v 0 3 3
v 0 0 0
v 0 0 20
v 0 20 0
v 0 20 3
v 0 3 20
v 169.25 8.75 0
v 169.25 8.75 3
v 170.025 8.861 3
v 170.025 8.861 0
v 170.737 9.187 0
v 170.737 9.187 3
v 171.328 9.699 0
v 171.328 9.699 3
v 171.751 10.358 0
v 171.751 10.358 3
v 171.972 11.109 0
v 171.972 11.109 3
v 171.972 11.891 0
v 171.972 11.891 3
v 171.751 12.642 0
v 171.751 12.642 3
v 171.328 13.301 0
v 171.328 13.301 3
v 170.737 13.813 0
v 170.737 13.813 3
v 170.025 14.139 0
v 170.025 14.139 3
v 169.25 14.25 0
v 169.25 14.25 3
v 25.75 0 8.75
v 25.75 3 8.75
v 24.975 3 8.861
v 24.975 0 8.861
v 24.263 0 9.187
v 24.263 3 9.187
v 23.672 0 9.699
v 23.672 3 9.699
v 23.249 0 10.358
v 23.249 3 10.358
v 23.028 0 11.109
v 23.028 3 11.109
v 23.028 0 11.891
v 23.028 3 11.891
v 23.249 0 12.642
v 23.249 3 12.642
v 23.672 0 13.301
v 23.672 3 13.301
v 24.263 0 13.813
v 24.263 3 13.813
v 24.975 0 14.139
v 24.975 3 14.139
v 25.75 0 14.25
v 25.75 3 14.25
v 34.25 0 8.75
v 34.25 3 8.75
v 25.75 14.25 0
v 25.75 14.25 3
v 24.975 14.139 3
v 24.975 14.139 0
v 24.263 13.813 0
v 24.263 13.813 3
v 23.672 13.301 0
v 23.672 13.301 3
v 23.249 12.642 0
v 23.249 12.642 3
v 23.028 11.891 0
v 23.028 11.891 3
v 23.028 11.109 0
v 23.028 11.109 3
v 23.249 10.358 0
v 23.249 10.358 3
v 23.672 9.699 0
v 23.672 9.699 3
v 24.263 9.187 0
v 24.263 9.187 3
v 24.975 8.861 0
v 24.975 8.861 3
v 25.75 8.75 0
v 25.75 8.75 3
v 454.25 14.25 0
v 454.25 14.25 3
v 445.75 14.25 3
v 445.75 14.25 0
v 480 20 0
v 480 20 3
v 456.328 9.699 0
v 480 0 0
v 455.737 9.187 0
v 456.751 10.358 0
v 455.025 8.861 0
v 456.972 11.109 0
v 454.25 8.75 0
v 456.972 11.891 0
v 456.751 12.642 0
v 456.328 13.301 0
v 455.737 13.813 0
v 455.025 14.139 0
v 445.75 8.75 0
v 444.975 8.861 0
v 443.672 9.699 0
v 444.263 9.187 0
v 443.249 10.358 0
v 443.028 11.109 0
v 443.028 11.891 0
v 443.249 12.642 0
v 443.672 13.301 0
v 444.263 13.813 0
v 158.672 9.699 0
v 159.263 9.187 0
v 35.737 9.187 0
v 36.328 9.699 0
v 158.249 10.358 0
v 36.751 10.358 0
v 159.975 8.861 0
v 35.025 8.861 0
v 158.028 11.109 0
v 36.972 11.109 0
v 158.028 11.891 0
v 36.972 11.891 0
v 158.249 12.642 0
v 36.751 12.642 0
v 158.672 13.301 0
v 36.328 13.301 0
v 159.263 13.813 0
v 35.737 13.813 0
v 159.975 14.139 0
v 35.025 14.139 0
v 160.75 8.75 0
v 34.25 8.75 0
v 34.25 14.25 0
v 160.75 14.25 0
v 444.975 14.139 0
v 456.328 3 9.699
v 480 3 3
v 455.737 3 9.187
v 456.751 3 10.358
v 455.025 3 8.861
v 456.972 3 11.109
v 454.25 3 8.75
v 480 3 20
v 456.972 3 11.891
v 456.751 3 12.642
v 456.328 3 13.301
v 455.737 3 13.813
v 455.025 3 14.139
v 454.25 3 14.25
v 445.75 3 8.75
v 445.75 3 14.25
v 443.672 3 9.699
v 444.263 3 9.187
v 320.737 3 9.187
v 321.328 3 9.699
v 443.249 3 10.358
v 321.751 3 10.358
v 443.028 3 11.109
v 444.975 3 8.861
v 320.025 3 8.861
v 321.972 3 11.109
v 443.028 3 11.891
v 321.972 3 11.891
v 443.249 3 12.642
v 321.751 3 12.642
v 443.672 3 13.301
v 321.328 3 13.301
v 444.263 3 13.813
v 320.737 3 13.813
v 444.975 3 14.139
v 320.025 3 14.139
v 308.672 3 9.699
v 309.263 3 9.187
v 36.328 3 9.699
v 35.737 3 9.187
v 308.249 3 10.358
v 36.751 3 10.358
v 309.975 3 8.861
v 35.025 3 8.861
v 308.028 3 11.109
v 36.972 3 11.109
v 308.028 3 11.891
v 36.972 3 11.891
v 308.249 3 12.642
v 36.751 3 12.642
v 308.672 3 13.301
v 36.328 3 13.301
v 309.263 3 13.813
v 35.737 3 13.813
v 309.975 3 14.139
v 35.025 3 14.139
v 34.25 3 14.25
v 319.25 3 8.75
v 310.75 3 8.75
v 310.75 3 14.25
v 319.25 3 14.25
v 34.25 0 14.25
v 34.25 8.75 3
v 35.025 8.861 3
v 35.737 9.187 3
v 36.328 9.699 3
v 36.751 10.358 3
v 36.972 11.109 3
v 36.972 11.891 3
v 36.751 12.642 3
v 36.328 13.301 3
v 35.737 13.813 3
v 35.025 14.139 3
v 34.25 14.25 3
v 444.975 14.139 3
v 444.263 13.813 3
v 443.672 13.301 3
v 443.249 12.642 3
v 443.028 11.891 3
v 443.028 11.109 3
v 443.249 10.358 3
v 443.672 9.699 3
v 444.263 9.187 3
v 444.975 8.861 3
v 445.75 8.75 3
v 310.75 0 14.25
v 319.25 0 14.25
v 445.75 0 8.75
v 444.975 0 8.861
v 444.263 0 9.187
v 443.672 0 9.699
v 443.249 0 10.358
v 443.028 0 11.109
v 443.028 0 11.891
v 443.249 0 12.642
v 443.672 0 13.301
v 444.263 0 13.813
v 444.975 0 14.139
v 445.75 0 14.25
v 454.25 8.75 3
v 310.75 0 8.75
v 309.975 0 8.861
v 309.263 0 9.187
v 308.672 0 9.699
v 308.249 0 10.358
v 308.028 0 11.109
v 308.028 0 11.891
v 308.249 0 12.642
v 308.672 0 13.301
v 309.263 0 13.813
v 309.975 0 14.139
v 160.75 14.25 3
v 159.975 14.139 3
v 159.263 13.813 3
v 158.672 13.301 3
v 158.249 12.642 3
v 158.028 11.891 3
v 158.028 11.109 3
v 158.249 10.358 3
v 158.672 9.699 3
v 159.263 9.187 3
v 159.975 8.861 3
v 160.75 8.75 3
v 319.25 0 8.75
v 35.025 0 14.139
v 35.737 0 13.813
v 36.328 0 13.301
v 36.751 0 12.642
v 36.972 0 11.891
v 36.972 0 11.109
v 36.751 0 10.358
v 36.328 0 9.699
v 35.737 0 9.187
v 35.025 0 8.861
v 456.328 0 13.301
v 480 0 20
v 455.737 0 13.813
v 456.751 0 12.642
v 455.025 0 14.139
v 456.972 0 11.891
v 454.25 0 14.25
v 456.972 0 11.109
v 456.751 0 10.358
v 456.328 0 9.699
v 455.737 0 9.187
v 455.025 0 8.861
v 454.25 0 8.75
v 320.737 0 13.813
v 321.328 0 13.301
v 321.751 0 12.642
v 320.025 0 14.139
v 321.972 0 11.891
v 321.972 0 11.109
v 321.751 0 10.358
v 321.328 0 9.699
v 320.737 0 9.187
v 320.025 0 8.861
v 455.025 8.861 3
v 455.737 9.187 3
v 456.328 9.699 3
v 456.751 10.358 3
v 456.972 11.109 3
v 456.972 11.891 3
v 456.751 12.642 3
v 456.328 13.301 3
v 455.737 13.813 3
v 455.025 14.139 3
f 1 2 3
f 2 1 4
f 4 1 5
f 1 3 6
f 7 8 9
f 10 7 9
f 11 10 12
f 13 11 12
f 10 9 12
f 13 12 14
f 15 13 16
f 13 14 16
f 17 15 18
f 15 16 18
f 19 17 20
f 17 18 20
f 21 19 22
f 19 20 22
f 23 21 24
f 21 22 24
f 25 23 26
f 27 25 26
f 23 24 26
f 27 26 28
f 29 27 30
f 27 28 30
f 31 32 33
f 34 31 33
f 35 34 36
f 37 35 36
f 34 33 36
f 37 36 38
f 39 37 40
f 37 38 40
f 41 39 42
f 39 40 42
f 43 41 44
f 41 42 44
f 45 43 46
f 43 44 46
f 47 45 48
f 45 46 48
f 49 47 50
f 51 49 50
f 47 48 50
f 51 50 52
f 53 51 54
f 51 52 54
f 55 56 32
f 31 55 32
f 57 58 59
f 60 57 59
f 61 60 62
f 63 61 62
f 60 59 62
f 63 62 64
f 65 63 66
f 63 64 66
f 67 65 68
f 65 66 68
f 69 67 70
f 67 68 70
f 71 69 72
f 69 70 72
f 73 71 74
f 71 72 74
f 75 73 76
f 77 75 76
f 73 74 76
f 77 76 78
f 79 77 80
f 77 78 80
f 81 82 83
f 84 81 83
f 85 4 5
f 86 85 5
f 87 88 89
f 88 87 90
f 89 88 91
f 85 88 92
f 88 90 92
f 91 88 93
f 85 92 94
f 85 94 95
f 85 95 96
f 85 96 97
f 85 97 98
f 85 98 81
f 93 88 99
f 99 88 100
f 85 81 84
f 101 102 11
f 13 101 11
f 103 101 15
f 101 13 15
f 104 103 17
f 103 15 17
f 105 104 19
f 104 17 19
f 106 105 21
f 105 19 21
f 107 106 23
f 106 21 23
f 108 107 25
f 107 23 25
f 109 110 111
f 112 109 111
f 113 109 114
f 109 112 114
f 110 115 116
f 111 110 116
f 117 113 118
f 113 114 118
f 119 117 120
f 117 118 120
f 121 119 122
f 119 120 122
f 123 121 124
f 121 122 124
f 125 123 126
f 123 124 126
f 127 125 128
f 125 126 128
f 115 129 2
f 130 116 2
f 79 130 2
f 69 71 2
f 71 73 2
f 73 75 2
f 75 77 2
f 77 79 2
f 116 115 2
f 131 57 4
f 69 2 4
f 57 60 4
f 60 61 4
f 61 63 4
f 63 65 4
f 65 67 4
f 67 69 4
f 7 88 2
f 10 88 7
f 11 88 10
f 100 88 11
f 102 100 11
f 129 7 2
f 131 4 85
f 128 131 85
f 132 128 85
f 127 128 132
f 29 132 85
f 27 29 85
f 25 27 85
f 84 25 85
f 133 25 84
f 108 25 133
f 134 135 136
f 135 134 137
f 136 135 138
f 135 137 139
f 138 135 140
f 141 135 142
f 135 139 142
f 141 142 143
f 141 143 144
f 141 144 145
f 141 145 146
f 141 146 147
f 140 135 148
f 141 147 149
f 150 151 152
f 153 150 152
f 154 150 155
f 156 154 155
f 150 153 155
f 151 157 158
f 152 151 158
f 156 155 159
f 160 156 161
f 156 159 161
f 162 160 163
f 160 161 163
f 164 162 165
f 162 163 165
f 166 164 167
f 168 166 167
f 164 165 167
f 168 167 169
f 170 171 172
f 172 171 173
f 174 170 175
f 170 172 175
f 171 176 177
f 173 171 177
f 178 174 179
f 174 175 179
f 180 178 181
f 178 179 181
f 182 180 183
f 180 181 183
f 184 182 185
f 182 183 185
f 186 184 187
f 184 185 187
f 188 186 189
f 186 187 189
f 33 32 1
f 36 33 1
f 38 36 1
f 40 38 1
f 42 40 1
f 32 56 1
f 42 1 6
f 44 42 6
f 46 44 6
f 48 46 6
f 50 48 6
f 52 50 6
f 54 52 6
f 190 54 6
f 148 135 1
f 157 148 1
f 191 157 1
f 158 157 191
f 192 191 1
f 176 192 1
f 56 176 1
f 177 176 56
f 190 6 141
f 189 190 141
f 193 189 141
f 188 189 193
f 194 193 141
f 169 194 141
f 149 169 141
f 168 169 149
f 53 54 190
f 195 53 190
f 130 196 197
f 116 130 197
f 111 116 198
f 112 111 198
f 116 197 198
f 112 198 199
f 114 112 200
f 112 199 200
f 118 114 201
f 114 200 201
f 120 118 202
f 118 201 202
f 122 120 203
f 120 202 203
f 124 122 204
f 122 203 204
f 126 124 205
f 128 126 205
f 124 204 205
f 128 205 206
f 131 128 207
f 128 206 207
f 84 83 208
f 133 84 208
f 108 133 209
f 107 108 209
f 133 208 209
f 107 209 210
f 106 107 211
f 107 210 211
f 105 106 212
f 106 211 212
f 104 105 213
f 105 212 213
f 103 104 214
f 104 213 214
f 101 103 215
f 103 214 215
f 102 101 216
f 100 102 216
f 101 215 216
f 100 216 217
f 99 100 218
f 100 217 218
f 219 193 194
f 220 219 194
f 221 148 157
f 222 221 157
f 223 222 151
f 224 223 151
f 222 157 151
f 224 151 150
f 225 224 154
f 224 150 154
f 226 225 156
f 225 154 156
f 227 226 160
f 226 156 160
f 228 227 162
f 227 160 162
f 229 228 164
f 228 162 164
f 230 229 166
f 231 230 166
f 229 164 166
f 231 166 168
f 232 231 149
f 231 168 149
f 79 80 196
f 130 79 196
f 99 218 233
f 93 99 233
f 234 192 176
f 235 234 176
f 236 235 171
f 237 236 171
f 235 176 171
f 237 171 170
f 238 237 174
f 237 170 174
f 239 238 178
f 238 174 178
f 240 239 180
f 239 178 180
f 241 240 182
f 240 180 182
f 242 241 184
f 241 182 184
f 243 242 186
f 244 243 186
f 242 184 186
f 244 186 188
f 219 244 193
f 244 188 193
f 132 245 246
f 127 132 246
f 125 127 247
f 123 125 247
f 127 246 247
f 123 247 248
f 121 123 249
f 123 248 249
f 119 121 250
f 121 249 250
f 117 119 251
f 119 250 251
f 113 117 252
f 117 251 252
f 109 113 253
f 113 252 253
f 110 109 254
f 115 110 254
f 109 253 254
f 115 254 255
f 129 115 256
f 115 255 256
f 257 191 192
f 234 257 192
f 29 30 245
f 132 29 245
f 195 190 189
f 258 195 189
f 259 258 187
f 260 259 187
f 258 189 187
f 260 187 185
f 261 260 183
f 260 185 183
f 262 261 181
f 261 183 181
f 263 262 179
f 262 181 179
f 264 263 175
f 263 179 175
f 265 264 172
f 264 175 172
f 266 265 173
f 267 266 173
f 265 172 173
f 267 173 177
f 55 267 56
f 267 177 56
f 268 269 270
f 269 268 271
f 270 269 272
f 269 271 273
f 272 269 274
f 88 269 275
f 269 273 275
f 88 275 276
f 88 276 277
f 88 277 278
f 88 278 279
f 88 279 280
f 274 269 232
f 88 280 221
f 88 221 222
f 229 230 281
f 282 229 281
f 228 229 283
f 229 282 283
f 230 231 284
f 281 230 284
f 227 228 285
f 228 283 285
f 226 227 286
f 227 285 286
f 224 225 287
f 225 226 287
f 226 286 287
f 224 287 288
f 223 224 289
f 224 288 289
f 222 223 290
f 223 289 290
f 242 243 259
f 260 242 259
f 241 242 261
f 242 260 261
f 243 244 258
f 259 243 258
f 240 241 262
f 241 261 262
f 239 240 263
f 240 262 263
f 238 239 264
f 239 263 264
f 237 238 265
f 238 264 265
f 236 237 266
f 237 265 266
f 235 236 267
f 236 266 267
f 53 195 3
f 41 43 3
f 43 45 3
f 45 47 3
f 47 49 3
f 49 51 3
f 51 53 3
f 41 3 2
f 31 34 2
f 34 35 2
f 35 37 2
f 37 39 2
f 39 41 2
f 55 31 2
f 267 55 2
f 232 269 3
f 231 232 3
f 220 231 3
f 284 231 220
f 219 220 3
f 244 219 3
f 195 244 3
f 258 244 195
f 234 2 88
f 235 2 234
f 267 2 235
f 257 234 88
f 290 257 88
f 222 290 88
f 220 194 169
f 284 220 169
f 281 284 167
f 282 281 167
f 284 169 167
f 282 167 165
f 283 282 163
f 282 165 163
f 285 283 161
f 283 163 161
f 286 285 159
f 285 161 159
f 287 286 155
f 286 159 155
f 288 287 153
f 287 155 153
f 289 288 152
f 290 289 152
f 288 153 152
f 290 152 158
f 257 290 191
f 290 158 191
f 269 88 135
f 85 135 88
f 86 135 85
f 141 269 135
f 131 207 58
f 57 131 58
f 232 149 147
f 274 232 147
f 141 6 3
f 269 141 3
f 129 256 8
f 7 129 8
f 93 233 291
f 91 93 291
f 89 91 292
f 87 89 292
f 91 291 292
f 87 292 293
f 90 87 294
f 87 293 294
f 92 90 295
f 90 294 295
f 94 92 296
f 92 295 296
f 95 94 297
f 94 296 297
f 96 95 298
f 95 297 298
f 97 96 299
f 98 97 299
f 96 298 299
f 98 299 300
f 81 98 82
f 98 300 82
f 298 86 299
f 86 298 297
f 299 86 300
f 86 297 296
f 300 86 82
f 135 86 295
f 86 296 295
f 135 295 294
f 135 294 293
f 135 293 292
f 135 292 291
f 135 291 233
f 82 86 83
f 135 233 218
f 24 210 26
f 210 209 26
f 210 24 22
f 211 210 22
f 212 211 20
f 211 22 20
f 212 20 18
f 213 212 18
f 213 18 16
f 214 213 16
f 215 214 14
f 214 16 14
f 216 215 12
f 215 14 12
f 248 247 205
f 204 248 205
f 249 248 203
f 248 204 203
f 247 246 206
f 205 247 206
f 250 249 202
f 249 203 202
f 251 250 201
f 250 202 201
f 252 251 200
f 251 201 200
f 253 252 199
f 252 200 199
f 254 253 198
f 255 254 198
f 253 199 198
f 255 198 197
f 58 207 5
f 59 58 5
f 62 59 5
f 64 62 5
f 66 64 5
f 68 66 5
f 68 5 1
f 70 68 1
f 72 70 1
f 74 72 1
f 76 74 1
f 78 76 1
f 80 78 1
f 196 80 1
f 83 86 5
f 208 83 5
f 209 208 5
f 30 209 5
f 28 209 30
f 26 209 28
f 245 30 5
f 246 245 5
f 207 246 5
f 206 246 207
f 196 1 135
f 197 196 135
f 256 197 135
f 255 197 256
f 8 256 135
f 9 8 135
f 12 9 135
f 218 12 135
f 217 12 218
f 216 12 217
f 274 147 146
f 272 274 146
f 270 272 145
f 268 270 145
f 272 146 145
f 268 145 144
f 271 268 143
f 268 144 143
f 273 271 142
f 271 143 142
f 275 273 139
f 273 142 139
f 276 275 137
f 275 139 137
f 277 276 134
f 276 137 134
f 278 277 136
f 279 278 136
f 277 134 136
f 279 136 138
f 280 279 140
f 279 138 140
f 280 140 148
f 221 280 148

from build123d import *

# Parameters (mm, degrees)
F1_DEPTH = 480
F3_DEPTH = 3
F5_DEPTH = 3


with BuildPart() as f1:
    # F0 (on Right) → F1 (new body)
    with BuildSketch(Plane.YZ):
        Polygon((0, 20), (0, 0), (20, 0), (20, 3), (3, 3), (3, 20), align=None)
    extrude(amount=F1_DEPTH)

    # F2 (on face) → F3 (cut)
    with BuildSketch(Plane(origin=(0, 3, 0), x_dir=(-1, 0, 0), z_dir=(0, 1, 0))):
        with BuildLine():
            Line((-445.75, 14.25), (-454.25, 14.25))
            ThreePointArc((-454.25, 14.25), (-457, 11.5), (-454.25, 8.75))
            Line((-454.25, 8.75), (-445.75, 8.75))
            ThreePointArc((-445.75, 8.75), (-443, 11.5), (-445.75, 14.25))
        make_face()
        with BuildLine():
            Line((-25.75, 14.25), (-34.25, 14.25))
            ThreePointArc((-34.25, 14.25), (-37, 11.5), (-34.25, 8.75))
            Line((-34.25, 8.75), (-25.75, 8.75))
            ThreePointArc((-25.75, 8.75), (-23, 11.5), (-25.75, 14.25))
        make_face()
        with BuildLine():
            Line((-310.75, 14.25), (-319.25, 14.25))
            ThreePointArc((-319.25, 14.25), (-322, 11.5), (-319.25, 8.75))
            Line((-319.25, 8.75), (-310.75, 8.75))
            ThreePointArc((-310.75, 8.75), (-308, 11.5), (-310.75, 14.25))
        make_face()
    extrude(amount=-F3_DEPTH, mode=Mode.SUBTRACT)

    # F4 (on face) → F5 (cut)
    with BuildSketch(Plane.XY.offset(3)):
        with BuildLine():
            Line((454.25, 14.25), (445.75, 14.25))
            ThreePointArc((445.75, 14.25), (443, 11.5), (445.75, 8.75))
            Line((445.75, 8.75), (454.25, 8.75))
            ThreePointArc((454.25, 8.75), (457, 11.5), (454.25, 14.25))
        make_face()
        with BuildLine():
            Line((169.25, 14.25), (160.75, 14.25))
            ThreePointArc((160.75, 14.25), (158, 11.5), (160.75, 8.75))
            Line((160.75, 8.75), (169.25, 8.75))
            ThreePointArc((169.25, 8.75), (172, 11.5), (169.25, 14.25))
        make_face()
        with BuildLine():
            Line((34.25, 14.25), (25.75, 14.25))
            ThreePointArc((25.75, 14.25), (23, 11.5), (25.75, 8.75))
            Line((25.75, 8.75), (34.25, 8.75))
            ThreePointArc((34.25, 8.75), (37, 11.5), (34.25, 14.25))
        make_face()
    extrude(amount=-F5_DEPTH, mode=Mode.SUBTRACT)


solid = f1.part
